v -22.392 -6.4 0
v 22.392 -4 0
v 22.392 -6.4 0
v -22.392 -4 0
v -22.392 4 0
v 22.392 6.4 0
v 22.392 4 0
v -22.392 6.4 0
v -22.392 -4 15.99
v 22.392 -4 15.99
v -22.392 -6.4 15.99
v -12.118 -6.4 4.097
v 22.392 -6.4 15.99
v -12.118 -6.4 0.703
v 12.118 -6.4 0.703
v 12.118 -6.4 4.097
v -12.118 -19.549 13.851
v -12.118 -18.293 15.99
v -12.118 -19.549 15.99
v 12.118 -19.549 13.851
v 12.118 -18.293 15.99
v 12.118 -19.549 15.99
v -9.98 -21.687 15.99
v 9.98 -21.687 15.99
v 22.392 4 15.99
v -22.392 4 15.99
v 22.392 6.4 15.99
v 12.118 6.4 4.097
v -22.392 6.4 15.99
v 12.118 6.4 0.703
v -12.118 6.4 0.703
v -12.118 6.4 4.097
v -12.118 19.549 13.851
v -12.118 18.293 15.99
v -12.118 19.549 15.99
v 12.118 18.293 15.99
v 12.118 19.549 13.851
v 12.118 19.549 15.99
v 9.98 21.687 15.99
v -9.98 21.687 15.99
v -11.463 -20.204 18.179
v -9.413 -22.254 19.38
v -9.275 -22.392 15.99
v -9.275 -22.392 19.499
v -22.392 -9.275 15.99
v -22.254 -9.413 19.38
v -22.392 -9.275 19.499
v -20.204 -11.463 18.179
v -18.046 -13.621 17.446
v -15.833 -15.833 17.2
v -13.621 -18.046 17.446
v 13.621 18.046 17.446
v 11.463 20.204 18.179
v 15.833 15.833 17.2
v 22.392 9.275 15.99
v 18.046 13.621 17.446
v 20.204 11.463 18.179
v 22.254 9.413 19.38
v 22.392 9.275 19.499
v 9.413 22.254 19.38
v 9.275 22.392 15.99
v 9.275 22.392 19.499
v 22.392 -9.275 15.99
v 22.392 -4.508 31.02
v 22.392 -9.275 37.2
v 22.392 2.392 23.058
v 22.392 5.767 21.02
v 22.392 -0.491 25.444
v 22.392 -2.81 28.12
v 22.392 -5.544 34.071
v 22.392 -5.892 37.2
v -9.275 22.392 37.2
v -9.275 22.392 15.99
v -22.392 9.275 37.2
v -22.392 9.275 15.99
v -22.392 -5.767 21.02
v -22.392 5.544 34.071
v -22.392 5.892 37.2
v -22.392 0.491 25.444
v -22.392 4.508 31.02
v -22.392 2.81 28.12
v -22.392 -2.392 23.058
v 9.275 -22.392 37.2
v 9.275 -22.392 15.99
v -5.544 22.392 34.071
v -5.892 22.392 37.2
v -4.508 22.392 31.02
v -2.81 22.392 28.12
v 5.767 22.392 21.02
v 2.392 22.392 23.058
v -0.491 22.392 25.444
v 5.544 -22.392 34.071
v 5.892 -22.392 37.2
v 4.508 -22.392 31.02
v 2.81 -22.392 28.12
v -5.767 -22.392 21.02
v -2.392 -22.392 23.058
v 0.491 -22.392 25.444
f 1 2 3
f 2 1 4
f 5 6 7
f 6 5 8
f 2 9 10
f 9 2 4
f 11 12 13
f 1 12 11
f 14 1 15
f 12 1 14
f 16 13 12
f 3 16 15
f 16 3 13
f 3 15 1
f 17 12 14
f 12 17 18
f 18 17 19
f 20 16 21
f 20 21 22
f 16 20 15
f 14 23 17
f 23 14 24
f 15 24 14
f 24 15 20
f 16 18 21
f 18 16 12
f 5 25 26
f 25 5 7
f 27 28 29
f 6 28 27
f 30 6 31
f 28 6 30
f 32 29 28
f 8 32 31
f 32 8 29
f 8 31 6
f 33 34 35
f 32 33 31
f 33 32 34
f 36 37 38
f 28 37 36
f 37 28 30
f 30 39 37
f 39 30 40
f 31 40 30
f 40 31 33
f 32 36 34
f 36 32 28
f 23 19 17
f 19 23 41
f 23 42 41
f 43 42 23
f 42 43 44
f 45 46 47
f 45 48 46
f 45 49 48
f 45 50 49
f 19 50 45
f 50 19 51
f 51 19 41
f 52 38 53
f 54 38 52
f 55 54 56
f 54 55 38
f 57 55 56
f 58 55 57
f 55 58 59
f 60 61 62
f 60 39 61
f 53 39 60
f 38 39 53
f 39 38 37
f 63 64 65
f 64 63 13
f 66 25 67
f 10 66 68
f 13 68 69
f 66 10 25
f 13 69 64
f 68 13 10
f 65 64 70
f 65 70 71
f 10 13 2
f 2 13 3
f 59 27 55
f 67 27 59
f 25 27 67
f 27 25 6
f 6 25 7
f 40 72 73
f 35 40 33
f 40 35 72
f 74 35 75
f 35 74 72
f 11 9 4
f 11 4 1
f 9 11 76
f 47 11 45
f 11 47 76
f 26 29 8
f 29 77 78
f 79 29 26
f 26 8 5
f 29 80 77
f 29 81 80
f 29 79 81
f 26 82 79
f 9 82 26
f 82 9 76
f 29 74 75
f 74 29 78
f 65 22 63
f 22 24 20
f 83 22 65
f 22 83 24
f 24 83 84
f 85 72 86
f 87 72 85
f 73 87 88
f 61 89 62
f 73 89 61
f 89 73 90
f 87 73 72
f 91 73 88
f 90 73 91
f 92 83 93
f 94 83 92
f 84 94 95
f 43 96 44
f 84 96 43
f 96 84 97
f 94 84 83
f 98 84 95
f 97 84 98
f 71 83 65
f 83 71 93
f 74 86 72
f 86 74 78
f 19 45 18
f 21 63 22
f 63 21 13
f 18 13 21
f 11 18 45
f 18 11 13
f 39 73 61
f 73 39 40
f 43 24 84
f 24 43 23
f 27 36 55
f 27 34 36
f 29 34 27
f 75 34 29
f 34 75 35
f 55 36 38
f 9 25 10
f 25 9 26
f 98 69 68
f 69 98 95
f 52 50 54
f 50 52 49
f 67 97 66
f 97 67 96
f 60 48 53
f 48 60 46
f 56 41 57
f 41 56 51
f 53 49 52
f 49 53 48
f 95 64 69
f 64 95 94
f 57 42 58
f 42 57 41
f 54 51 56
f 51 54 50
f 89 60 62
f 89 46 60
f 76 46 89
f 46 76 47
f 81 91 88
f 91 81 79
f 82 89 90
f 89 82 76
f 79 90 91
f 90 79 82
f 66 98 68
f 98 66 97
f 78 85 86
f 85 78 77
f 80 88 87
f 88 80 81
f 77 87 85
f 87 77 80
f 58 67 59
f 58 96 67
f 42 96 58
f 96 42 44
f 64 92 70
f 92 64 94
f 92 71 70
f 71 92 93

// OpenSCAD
// -*- mode: SCAD ; c-file-style: "ellemtel" ; coding: utf-8 -*-
//
// Inner tube foot for acrylic i3-style printers with 8 mm plates.
// For example GeeTech i3s.
//
// © 2018 Roland Sieker <ospalh@gmail.com>
// Licence: CC-BY-SA 4.0


// A single plate. Millimetres
plate_width = 8.0;  // [2:0.1:15]

// Inflate it accordingly… Millimetres
inner_tube_diameter = 40;  // [20:1:50]

// … to preview. You will get all parts when you click “Create Thing”.
part = "single"; // [single: foot for single acrylic plaet, double: foot for double plates]

// Set this to “render” and click on “Create Thing” when done with the setup.
preview = 1; // [0:render, 1:preview]



/* [Hidden] */

// Done with the customizer

w = 2.4;  // external wall width
p = 1.2;  // height of the connecting plate
min_ph = 10;  // Minimum height of the plate thing

// *******************************************************
// Some shortcuts. These shouldn’t be changed

tau = 2 * PI;  // π is still wrong. τ = ⌀ ÷ r
angle = 45; // The overhangs are not expected to look good here.
z_factor = tan(angle);


some_distance = 2*inner_tube_diameter;
ms = 0.01;  // Muggeseggele.

// fn for differently sized objects, for preview or rendering.
pfa = 40;
pfb = 15;
rfa = 180;
rfb = 30;
function fa() = (preview) ? pfa : rfa;
function fb() = (preview) ? pfb : rfb;

// *******************************************************
// End setup



// *******************************************************
// Generate the parts

print_part();
// preview_parts();


module print_part()
{
   if ("single" == part)
   {
      foot(plate_width);
   }
   if ("double" == part)
   {
      foot(2*plate_width);
   }

}

module preview_parts()
{
   foot(plate_width);
   translate([some_distance, 0, 0])
   {
      foot(2*plate_width);
   }
}



// *******************************************************
// Code for the parts themselves


module foot(pw)
{
   itr = inner_tube_diameter/2;
   ir = itr + w;
   or = ir*1.082;  // Inner to outer radius of an octagon

   po = ir - pw/2 - w; // offset. How far we have to butress the thing

   ph = max(po*z_factor, min_ph);
   st_l = sqrt(ph*ph+po*po);
   st_a = acos((ph)/st_l);

   // The clip top part
   intersection()
   {
      union()
      {
         side_plate();
         mirror([0,1,0])
         {
            side_plate();
         }

      }
      rotate(22.5)
      {
         cylinder(r=or, h=ph, $fn=8);
      }
   }

   difference()
   {
      translate([0, 0, ph-ms])
      {
         rotate(22.5)
         {
            cylinder(r=or, h=itr+p+ms, $fn=8);
         }
      }
      translate([0, 0, ph+p+itr])
      {
         rotate(45)
         {
            rotate([0,90,0])
            {
               cylinder(r=itr,h=2*or+2*ms,center=true, $fn=fa());
            }
         }
      }
   }
   module side_plate()
   {
      translate([0, -pw/2-w, 0])
      {
         translate([-or, 0, 0])
         cube([2*or, w, ph]);
         //w-w*tan(st_a),
         translate([-or/2, w-w*cos(st_a), 0])
         {
            rotate([st_a, 0, 0])
            {
               {
                  cube([or, w, st_l+w]);
               }
            }
         }
      }

   }

}
